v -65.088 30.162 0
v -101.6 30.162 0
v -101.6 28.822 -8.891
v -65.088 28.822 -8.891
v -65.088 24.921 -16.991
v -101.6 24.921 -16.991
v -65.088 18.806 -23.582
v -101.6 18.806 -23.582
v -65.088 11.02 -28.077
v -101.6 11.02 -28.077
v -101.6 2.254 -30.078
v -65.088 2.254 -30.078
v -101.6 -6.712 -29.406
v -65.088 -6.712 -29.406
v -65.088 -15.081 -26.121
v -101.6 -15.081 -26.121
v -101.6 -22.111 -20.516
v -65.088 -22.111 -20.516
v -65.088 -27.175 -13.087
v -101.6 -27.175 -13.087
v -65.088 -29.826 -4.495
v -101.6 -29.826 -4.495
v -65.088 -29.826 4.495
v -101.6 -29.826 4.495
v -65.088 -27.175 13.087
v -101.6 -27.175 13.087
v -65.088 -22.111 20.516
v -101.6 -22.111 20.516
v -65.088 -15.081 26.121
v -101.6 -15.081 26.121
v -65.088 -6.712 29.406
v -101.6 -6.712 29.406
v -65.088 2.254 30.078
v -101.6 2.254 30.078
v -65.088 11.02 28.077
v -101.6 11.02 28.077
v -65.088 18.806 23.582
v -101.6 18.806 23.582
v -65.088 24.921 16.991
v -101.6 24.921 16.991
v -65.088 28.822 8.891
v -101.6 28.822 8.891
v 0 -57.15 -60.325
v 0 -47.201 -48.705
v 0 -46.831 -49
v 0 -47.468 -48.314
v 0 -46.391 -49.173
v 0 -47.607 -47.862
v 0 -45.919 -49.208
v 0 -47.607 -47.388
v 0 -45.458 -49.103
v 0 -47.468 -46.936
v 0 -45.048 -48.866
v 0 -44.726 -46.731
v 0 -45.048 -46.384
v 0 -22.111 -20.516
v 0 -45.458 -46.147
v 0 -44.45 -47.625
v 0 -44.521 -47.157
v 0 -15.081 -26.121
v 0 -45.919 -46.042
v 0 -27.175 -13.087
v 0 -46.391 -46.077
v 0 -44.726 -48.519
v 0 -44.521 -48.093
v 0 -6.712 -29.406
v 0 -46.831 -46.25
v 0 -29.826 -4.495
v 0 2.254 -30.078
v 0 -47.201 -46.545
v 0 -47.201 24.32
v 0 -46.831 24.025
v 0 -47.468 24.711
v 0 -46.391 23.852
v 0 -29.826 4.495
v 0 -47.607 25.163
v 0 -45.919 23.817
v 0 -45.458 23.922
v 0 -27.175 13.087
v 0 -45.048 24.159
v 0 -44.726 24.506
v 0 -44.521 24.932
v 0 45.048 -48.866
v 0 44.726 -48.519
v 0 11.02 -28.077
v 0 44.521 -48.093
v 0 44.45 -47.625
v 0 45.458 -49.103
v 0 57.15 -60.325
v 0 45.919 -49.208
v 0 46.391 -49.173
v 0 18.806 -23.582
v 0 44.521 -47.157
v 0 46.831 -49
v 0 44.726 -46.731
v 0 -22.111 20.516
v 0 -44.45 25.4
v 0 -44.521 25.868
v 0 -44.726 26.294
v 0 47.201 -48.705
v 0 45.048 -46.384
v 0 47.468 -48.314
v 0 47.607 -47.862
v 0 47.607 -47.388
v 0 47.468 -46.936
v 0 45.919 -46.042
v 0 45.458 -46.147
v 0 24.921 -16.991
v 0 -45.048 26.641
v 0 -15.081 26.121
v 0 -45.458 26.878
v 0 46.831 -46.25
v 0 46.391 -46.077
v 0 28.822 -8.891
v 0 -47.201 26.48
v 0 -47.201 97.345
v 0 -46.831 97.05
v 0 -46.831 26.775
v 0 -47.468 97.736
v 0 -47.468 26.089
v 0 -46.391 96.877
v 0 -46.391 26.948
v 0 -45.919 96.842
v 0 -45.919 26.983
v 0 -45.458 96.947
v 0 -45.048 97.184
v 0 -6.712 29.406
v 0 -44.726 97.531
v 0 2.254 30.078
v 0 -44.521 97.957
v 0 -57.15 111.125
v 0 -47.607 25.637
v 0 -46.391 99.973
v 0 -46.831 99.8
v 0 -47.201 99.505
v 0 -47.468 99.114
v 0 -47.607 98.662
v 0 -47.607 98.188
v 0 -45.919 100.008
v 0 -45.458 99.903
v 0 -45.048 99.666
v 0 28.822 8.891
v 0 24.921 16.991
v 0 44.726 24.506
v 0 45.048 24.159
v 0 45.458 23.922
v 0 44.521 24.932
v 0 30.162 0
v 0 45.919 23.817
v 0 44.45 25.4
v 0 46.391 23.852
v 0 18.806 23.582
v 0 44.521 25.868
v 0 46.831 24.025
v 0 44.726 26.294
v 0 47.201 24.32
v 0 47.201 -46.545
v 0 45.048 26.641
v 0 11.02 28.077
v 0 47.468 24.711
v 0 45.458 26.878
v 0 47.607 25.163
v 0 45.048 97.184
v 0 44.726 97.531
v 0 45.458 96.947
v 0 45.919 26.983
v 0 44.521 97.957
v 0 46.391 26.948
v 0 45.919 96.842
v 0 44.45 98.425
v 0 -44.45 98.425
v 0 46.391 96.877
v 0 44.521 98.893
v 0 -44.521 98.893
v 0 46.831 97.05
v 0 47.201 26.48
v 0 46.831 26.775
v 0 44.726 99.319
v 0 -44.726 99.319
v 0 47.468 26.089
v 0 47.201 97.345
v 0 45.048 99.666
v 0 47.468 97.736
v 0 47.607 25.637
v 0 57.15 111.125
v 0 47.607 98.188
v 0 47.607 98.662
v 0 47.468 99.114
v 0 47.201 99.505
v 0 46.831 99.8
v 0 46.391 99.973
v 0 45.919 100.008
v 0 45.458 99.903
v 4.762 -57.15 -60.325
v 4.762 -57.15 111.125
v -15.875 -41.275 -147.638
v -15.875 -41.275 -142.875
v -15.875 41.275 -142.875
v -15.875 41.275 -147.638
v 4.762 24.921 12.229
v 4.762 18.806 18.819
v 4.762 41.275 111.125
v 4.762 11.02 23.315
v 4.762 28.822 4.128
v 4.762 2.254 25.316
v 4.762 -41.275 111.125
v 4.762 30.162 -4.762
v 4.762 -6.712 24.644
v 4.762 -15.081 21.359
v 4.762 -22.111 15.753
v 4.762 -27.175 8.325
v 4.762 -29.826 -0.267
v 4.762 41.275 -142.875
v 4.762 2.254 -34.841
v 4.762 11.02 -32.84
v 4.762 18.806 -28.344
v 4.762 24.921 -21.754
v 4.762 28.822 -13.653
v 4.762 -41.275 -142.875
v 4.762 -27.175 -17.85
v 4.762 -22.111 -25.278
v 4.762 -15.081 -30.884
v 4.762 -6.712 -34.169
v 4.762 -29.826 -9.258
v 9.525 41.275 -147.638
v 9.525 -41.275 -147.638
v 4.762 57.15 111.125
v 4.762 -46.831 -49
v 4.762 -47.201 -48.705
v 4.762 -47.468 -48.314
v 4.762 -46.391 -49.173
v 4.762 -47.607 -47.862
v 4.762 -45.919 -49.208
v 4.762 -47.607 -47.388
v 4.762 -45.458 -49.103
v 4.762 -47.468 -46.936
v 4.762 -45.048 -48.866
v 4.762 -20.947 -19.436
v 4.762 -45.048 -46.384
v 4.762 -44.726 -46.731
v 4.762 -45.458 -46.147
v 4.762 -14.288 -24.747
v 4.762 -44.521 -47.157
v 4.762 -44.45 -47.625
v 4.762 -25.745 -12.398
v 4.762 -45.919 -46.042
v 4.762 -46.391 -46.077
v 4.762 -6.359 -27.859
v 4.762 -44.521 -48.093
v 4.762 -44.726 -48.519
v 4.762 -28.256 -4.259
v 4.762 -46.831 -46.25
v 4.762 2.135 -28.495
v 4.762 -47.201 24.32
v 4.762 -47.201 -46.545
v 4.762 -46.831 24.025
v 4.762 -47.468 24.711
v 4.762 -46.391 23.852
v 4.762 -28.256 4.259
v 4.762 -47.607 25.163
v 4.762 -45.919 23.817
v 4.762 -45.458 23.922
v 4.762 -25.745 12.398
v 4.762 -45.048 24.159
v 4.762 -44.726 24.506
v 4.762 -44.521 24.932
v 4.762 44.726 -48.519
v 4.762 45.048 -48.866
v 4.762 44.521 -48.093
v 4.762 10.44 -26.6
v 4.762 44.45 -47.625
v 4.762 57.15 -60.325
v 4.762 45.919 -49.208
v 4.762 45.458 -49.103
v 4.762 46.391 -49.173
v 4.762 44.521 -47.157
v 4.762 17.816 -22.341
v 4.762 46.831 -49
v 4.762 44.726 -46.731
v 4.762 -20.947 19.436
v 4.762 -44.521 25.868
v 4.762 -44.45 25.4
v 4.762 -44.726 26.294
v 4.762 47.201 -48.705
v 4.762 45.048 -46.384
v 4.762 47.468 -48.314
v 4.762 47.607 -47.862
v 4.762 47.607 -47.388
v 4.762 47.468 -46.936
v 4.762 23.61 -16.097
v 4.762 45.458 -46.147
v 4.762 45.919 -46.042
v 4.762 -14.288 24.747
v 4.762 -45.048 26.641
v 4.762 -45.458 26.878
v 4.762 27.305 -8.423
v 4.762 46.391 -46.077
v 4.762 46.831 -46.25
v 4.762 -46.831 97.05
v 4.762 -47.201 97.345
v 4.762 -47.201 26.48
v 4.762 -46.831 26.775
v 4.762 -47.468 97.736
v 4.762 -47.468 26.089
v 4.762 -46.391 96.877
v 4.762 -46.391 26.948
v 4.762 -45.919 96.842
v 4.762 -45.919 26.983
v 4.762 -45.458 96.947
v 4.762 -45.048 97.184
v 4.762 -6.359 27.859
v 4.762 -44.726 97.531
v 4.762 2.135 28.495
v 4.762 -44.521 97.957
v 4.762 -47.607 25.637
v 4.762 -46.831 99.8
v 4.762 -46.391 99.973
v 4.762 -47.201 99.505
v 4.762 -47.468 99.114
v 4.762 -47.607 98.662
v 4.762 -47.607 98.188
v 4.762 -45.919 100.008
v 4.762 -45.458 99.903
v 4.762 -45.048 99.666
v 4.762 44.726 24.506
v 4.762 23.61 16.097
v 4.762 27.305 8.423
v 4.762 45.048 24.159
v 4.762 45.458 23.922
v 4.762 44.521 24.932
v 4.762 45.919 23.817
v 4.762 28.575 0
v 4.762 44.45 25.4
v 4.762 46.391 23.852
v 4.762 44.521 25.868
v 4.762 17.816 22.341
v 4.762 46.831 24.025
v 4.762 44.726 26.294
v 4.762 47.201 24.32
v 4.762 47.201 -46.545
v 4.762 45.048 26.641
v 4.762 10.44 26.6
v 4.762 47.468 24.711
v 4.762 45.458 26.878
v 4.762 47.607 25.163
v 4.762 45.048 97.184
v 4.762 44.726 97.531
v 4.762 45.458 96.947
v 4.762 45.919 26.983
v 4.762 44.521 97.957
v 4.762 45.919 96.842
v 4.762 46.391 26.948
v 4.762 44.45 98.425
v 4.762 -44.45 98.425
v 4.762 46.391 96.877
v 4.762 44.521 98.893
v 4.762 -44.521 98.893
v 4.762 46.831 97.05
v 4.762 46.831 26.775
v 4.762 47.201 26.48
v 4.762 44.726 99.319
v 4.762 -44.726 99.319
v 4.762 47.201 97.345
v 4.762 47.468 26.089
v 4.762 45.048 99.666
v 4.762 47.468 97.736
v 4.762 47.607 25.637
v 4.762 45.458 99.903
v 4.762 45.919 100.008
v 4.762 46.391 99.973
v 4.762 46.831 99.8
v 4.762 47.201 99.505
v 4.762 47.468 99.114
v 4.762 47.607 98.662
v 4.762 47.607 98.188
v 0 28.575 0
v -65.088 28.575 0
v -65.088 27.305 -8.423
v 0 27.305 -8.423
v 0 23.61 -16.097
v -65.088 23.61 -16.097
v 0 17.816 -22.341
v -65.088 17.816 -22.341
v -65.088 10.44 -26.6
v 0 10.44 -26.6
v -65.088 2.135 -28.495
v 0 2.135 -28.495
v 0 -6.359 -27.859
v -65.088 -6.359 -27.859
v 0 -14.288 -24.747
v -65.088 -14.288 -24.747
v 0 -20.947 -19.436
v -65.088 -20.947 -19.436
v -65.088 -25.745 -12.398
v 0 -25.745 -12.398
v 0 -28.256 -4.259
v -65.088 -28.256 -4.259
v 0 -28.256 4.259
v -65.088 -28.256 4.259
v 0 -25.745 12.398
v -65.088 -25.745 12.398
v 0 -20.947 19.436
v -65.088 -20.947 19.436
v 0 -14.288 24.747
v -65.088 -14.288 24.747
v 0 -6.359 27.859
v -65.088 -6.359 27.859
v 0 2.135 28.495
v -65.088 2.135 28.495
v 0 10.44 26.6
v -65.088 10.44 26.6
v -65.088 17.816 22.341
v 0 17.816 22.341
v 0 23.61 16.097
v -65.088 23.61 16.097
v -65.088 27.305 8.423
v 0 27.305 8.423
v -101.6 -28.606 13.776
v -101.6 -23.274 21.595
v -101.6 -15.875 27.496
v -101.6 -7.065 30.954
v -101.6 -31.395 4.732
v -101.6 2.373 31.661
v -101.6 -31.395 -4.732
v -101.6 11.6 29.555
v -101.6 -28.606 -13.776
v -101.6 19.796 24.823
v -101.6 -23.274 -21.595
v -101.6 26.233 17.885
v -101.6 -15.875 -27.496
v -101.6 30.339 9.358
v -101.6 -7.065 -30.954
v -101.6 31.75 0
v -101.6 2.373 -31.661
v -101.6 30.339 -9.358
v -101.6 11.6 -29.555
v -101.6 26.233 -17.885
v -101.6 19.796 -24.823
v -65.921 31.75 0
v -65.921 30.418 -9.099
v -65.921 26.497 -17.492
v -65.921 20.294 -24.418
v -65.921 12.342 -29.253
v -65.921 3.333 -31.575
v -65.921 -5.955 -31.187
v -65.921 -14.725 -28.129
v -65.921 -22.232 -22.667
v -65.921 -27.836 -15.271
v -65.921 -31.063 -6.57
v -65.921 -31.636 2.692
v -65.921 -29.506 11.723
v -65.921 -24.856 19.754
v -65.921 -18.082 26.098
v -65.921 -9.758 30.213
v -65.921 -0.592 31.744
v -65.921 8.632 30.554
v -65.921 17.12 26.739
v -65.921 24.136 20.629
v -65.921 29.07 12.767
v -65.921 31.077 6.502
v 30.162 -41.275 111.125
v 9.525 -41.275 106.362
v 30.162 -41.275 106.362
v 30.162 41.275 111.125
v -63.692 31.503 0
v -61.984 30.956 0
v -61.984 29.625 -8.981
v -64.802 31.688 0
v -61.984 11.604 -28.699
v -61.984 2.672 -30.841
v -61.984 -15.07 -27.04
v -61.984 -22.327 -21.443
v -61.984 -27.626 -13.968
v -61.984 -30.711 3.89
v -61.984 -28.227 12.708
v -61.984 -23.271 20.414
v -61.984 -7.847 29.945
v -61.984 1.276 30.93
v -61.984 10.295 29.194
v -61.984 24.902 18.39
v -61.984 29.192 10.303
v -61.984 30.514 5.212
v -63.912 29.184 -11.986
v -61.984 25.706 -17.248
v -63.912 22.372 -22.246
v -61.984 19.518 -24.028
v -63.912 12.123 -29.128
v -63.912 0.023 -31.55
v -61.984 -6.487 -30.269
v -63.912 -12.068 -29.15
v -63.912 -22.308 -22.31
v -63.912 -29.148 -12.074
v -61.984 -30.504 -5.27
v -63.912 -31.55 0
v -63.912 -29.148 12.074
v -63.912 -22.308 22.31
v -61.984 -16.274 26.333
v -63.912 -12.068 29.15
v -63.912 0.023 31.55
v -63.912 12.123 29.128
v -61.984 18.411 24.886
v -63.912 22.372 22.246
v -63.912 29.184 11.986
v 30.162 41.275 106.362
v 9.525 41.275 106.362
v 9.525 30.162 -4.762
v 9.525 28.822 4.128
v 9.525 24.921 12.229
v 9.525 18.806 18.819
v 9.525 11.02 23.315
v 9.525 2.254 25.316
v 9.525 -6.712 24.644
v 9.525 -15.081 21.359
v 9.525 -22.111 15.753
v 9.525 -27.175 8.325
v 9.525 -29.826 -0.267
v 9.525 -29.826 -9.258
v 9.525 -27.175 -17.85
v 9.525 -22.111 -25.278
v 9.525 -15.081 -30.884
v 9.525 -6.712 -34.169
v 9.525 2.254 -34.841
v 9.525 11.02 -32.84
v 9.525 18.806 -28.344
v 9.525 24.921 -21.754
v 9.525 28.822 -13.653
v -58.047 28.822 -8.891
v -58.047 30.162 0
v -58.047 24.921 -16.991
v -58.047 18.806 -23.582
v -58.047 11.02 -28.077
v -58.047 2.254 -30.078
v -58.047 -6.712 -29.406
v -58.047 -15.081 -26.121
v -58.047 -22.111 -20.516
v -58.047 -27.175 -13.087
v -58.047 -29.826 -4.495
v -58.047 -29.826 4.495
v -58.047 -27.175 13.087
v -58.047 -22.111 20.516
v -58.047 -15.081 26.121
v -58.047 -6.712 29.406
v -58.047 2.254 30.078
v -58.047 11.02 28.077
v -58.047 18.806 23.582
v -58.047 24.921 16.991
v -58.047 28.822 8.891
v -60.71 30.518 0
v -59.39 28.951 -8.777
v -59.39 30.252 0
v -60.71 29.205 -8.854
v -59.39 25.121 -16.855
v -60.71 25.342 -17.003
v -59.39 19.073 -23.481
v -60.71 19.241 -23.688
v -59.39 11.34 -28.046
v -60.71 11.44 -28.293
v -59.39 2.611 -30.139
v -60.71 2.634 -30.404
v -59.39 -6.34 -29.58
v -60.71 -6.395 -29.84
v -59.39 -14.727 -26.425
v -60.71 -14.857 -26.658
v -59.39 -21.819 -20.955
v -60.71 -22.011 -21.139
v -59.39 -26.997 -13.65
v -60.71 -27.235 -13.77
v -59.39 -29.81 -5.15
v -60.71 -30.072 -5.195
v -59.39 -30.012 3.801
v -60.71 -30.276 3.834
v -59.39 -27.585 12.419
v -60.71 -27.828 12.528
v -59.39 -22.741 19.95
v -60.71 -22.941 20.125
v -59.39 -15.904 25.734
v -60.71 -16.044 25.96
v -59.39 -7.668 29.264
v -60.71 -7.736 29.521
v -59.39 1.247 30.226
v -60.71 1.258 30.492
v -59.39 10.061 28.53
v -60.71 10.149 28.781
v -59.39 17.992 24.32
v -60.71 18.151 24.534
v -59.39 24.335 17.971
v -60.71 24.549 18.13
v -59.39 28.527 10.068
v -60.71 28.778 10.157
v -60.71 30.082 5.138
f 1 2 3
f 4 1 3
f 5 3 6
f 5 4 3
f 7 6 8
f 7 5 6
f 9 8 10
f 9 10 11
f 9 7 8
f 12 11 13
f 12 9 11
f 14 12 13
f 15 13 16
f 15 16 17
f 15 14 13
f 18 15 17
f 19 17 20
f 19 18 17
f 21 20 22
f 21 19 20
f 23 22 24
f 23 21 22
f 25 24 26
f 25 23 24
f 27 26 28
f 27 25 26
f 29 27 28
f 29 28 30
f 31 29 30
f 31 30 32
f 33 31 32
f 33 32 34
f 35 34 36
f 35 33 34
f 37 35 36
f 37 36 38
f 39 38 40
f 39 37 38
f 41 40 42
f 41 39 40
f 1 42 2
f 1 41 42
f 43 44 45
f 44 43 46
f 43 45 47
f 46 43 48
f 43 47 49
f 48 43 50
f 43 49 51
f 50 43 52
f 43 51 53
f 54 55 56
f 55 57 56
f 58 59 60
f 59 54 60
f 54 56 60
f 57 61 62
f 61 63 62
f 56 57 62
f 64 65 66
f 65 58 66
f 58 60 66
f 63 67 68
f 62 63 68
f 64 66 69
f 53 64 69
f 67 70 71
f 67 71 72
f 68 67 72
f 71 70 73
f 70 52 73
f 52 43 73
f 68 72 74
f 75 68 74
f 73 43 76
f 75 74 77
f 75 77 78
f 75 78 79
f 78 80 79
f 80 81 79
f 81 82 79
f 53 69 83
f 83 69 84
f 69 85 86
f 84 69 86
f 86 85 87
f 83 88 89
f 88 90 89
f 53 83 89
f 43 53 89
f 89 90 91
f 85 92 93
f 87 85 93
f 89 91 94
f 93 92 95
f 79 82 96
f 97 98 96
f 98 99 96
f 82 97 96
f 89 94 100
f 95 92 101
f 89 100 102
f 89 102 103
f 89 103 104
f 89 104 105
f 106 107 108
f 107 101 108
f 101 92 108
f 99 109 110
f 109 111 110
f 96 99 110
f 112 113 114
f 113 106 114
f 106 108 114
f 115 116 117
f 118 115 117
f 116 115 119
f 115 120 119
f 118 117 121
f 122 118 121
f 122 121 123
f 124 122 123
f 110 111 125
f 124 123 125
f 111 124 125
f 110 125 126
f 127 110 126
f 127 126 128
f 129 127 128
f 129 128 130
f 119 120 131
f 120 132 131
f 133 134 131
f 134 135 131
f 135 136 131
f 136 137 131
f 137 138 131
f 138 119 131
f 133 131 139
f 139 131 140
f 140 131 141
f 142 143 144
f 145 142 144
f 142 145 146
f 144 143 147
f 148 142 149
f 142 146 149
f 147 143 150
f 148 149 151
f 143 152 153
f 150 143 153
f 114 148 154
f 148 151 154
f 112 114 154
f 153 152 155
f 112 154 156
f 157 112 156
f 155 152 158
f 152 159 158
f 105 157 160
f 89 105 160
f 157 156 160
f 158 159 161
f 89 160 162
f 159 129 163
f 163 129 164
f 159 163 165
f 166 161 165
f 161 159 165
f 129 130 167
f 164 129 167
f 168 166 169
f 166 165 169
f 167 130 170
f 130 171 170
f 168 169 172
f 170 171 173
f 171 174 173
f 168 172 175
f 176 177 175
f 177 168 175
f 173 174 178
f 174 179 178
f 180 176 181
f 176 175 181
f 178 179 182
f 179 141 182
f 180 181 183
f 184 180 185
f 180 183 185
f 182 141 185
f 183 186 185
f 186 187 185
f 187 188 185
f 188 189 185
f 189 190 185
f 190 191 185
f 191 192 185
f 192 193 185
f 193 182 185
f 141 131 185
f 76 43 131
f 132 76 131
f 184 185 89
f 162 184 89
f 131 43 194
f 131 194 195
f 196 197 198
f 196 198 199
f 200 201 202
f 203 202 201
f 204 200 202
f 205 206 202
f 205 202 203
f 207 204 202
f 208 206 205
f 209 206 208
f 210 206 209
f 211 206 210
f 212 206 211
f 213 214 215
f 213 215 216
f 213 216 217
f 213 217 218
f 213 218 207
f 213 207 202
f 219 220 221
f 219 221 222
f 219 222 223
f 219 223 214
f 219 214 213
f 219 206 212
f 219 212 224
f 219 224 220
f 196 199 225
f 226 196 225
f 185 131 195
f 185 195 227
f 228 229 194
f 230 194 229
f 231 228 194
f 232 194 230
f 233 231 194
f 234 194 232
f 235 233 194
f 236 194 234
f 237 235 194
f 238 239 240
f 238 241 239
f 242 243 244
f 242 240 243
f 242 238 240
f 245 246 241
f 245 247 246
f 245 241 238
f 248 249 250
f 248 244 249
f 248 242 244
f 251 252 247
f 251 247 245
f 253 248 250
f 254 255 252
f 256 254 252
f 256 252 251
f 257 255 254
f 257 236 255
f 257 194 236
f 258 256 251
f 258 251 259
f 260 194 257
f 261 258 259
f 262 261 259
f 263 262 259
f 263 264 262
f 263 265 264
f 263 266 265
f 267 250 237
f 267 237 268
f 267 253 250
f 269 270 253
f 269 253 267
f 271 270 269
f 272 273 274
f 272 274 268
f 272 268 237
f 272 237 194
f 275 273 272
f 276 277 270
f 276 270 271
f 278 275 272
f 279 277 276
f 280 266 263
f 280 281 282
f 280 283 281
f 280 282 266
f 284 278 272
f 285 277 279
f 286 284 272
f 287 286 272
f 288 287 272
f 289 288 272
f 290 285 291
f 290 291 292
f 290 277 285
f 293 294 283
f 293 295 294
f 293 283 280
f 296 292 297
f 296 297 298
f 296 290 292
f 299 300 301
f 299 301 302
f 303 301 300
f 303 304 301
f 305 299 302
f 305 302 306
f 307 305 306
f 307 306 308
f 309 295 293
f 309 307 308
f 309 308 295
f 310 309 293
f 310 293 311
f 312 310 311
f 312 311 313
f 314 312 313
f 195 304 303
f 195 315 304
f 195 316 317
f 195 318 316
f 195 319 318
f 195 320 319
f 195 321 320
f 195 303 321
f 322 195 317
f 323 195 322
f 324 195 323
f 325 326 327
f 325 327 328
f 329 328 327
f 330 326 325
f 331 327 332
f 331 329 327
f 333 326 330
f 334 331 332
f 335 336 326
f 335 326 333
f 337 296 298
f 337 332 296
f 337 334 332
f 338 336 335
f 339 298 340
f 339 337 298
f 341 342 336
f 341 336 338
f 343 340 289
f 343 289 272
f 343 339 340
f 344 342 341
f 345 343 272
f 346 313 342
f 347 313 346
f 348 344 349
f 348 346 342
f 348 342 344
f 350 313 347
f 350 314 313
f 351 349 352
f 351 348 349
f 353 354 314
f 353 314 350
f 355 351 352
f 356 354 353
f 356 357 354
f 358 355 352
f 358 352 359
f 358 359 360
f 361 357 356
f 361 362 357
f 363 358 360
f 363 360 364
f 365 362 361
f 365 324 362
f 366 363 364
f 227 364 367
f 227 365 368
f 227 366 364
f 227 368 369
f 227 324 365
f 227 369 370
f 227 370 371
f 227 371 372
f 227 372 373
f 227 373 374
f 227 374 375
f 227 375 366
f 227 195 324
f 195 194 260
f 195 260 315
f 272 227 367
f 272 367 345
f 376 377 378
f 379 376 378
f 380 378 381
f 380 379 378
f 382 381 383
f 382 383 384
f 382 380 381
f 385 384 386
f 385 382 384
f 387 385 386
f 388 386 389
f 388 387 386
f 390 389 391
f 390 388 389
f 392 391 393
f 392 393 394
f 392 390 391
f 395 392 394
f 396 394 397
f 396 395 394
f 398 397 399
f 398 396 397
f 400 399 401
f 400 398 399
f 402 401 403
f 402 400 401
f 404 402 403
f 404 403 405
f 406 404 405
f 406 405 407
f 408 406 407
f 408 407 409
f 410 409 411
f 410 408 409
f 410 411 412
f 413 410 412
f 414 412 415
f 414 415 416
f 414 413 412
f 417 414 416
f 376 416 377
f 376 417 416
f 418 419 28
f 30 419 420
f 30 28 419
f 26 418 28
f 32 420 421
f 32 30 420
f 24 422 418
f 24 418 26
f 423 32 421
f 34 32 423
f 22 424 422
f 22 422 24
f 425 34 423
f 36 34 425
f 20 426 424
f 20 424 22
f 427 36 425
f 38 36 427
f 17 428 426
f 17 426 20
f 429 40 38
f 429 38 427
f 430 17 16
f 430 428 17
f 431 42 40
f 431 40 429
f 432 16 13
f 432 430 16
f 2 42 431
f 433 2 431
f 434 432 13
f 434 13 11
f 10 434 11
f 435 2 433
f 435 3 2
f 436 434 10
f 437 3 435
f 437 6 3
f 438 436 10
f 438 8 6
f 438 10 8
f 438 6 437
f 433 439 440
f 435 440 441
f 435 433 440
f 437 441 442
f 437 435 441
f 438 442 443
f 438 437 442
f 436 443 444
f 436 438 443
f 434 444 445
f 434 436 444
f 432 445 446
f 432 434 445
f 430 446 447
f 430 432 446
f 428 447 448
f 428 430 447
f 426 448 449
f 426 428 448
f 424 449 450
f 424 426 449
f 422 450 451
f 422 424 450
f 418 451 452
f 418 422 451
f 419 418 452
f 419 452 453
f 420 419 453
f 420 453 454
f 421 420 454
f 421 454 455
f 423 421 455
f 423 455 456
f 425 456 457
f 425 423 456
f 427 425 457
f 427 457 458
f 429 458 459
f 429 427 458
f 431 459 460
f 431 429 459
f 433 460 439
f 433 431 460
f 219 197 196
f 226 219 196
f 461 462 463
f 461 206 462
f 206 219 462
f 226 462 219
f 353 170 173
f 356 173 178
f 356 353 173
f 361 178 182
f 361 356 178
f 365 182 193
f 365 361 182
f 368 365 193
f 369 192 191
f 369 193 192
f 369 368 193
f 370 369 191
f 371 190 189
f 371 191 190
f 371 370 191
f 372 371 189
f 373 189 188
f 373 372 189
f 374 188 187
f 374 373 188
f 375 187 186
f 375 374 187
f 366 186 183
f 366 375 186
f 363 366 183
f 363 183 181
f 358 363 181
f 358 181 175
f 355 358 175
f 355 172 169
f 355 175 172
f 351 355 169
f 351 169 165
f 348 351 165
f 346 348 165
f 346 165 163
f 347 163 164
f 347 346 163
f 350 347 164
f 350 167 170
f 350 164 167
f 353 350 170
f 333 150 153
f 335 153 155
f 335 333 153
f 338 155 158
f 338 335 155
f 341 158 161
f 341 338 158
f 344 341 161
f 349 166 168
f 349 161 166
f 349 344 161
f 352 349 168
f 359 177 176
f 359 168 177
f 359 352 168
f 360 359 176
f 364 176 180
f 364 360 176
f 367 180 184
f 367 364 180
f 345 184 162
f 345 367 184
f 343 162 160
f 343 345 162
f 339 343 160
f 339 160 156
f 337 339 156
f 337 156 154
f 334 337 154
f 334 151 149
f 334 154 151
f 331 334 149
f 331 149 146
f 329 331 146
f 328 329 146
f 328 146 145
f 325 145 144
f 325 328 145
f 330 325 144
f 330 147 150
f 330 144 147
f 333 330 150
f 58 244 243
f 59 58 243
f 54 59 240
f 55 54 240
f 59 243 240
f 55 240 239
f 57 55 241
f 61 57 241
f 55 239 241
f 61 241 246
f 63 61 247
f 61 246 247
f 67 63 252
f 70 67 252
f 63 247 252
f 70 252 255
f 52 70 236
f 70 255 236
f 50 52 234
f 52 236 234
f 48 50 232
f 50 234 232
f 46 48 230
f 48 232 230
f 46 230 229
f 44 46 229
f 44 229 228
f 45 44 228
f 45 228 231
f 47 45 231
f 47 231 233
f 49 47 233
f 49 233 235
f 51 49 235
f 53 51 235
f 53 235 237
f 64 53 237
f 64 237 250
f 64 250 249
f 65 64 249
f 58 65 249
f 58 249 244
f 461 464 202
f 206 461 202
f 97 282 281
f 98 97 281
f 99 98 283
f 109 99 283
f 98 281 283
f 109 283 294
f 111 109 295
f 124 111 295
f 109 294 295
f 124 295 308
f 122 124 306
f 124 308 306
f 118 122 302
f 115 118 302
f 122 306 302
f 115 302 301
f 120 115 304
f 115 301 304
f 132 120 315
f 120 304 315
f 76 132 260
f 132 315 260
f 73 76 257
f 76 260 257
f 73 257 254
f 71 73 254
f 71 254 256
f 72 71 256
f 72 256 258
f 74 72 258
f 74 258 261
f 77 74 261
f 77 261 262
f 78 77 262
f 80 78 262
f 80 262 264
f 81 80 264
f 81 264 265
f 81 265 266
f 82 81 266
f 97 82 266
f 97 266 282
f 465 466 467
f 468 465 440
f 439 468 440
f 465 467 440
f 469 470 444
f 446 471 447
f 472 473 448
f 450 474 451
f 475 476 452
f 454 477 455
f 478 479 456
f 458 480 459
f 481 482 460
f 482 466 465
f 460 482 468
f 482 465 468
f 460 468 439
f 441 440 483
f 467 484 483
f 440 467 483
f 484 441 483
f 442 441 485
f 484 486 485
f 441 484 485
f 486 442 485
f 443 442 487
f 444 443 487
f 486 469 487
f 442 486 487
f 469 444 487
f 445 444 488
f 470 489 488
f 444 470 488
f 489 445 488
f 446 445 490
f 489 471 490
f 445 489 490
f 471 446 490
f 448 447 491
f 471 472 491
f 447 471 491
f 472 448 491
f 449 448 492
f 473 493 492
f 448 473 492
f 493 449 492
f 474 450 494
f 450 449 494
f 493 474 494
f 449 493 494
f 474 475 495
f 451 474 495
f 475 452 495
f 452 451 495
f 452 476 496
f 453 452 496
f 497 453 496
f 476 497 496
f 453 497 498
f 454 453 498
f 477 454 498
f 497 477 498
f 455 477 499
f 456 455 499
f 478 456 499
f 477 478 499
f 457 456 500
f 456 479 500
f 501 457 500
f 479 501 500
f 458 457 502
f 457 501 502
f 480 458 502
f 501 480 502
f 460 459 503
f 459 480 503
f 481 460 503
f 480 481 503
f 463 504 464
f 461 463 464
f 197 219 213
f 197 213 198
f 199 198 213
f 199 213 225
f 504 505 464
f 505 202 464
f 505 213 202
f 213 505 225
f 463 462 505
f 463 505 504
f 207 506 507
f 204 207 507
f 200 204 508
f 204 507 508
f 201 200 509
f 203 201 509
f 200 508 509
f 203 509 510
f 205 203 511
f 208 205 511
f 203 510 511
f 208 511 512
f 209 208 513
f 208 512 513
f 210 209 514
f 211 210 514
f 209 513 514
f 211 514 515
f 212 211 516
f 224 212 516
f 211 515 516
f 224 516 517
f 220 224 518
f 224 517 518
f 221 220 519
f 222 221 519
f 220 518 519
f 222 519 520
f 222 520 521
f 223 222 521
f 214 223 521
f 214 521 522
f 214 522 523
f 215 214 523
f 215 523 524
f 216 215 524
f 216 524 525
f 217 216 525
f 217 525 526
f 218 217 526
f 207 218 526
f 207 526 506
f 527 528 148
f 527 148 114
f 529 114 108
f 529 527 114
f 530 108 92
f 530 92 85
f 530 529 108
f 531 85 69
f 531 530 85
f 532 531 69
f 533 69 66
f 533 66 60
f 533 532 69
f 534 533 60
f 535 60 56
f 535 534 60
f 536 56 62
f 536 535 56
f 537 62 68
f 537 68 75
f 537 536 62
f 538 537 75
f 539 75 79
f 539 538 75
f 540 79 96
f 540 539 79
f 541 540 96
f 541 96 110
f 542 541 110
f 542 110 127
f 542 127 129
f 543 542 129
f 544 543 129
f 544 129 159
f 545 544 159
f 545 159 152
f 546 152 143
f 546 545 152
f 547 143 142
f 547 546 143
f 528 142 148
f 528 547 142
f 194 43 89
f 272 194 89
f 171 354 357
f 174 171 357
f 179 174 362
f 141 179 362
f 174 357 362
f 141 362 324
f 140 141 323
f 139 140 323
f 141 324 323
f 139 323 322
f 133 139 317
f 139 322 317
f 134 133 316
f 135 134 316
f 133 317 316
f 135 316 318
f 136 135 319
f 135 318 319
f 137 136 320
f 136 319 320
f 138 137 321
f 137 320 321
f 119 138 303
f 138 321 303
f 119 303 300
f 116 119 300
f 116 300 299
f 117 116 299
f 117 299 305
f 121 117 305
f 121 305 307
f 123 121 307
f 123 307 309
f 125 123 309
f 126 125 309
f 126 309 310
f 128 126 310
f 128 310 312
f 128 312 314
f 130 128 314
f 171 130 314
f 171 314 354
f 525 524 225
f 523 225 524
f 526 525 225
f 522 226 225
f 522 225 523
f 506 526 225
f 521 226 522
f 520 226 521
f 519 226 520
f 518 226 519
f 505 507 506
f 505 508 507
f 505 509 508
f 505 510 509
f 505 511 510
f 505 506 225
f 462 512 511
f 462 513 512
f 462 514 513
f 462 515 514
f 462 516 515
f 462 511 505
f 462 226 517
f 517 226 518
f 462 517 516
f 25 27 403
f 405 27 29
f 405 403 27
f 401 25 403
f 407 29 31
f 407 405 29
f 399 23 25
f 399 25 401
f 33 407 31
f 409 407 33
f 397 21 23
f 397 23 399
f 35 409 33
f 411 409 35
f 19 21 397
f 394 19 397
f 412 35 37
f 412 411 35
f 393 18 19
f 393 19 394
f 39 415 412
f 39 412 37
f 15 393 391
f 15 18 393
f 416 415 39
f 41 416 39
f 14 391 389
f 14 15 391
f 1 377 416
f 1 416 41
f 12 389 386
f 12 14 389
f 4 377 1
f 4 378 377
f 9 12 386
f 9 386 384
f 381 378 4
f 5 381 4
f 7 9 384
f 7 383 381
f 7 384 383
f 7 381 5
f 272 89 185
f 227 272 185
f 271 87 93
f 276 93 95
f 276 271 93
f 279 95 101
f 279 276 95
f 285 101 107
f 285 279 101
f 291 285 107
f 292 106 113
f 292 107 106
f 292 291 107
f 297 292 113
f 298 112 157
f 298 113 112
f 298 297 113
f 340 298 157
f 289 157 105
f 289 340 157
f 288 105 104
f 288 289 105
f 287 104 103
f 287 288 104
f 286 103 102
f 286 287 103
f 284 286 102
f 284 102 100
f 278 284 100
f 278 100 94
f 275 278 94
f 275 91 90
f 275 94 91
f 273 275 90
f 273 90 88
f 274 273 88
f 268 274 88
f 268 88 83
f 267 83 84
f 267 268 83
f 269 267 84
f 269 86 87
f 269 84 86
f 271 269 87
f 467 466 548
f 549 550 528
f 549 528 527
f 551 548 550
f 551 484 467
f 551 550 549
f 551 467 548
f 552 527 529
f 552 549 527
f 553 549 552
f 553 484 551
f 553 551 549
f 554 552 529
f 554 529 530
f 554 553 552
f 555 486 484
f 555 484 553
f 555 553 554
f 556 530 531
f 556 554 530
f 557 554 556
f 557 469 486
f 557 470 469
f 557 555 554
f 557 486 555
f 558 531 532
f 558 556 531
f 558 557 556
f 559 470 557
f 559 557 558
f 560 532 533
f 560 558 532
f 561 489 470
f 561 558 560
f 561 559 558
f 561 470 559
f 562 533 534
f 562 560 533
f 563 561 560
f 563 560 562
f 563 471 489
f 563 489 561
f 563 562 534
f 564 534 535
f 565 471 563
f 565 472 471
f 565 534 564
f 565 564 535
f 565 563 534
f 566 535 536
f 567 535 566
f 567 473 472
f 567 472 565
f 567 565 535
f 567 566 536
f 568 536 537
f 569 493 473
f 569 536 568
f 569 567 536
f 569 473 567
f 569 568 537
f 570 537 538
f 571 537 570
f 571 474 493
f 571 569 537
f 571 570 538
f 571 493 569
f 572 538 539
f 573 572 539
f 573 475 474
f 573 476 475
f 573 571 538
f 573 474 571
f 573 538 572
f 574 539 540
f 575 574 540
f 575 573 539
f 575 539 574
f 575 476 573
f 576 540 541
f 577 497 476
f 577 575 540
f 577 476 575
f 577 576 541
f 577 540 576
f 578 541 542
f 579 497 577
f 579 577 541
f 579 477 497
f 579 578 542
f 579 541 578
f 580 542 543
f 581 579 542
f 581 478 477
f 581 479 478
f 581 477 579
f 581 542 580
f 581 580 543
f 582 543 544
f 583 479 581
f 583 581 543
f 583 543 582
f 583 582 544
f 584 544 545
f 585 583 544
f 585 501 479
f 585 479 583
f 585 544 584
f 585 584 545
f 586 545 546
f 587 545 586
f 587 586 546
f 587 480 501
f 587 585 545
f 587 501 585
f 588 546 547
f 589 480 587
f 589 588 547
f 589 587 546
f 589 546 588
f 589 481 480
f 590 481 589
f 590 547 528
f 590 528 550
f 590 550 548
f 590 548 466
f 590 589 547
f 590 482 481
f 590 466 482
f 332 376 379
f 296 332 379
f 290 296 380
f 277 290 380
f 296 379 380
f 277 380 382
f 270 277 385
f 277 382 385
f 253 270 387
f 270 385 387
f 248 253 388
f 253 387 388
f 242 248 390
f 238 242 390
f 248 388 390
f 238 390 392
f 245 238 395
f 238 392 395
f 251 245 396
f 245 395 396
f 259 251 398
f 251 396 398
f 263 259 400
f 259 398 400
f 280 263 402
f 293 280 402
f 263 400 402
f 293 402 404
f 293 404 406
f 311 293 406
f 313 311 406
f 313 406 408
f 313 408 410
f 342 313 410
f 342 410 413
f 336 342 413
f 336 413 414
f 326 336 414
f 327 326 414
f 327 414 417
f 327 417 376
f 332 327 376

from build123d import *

# Parameters (mm, degrees)
F4_R      = 10.16
F5_W      = 114.3
F5_H      = 171.45
F6_DEPTH  = 4.7625
F7_DEPTH  = 4.7635
F8_R      = 1.5875
F9_DEPTH  = 106.3635001
F11_DEPTH = 41.275
F12_R     = 30.1625
F13_DEPTH = 111.1260001


# Not quite as in the source:
# - a fillet or chamfer that OpenCascade refuses, or shapes differently, is made with other operations: its cross-section is extruded or revolved along the edge and cut away or added
# - a pattern or mirror of a feature is missing from the dataset's text; its kind, count and spacing are read off the source's solid


with BuildPart() as f2:
    # F0 (on Top) → F2 (revolve)
    with BuildSketch(Plane.XY):
        Polygon((-65.0875, 28.575), (0, 28.575), (0, 30.1625), (-63.5, 30.1625), (-63.5, 31.75), (-101.6, 31.75), (-101.6, 30.1625), (-65.0875, 30.1625), align=None)
    revolve(axis=Axis((-31.0941394418, 0, 0), (-1, 0, 0)))

    # F3: fillet of radius 10.16 on 1 edges, made by hand

    # F3_s1 → F3_t2 (revolve)
    with BuildSketch(Plane.XY):
        with BuildLine():
            ThreePointArc((-58.0467584182, 30.1625), (-60.8865647496, 30.5674449002), (-63.5, 31.75))
            Line((-63.5, 31.75), (-63.5, 30.1625))
            Line((-63.5, 30.1625), (-58.0467584182, 30.1625))
        make_face()
    revolve(axis=Axis((-63.5, 0, 0), (-1, 0, 0)))

    # F4
    f4_edges = [f2.edges().sort_by_distance(p)[0] for p in [
        (-63.5, -31.75, 0),
    ]]
    fillet(f4_edges, radius=F4_R)

    # F5 (on Right) → F6 (join)
    with BuildSketch(Plane.YZ):
        with Locations((0, 25.4)):
            Rectangle(F5_W, F5_H)
    extrude(amount=F6_DEPTH)

    # F7 (cut, through all): a face of the model
    f7_faces = [f2.faces().sort_by_distance(p)[0] for p in [
        (0, 0, 0),
    ]]
    extrude(f7_faces, amount=-F7_DEPTH, mode=Mode.SUBTRACT)

    # F8 (on face) → F9 (cut, through all)
    with BuildSketch(Plane.YZ.offset(4.7625)):
        with Locations((-46.0375, -47.625)):
            Circle(F8_R)
        with Locations((-46.0375, 25.4)):
            Circle(F8_R)
        with Locations((-46.0375, 98.425)):
            Circle(F8_R)
    f9 = extrude(amount=-F9_DEPTH, mode=Mode.SUBTRACT)

    # F9_copies: F9 across plane
    add(f9.mirror(Plane.ZX), mode=Mode.SUBTRACT)


with BuildPart() as f11:
    # F10 (on Front) → F11 (new body, symmetric)
    with BuildSketch(Plane.XZ):
        Polygon((4.7625, 111.125), (4.7625, -142.875), (-15.875, -142.875), (-15.875, -147.6375), (9.525, -147.6375), (9.525, 106.3625), (30.1625, 106.3625), (30.1625, 111.125), align=None)
    extrude(amount=F11_DEPTH, both=True)

    # F12 (on face) → F13 (cut, through all)
    with BuildSketch(Plane.YZ.offset(9.525)):
        with Locations((0, -4.7625)):
            Circle(F12_R)
    extrude(amount=-F13_DEPTH, mode=Mode.SUBTRACT)


solid = Compound([f2.part, f11.part])
